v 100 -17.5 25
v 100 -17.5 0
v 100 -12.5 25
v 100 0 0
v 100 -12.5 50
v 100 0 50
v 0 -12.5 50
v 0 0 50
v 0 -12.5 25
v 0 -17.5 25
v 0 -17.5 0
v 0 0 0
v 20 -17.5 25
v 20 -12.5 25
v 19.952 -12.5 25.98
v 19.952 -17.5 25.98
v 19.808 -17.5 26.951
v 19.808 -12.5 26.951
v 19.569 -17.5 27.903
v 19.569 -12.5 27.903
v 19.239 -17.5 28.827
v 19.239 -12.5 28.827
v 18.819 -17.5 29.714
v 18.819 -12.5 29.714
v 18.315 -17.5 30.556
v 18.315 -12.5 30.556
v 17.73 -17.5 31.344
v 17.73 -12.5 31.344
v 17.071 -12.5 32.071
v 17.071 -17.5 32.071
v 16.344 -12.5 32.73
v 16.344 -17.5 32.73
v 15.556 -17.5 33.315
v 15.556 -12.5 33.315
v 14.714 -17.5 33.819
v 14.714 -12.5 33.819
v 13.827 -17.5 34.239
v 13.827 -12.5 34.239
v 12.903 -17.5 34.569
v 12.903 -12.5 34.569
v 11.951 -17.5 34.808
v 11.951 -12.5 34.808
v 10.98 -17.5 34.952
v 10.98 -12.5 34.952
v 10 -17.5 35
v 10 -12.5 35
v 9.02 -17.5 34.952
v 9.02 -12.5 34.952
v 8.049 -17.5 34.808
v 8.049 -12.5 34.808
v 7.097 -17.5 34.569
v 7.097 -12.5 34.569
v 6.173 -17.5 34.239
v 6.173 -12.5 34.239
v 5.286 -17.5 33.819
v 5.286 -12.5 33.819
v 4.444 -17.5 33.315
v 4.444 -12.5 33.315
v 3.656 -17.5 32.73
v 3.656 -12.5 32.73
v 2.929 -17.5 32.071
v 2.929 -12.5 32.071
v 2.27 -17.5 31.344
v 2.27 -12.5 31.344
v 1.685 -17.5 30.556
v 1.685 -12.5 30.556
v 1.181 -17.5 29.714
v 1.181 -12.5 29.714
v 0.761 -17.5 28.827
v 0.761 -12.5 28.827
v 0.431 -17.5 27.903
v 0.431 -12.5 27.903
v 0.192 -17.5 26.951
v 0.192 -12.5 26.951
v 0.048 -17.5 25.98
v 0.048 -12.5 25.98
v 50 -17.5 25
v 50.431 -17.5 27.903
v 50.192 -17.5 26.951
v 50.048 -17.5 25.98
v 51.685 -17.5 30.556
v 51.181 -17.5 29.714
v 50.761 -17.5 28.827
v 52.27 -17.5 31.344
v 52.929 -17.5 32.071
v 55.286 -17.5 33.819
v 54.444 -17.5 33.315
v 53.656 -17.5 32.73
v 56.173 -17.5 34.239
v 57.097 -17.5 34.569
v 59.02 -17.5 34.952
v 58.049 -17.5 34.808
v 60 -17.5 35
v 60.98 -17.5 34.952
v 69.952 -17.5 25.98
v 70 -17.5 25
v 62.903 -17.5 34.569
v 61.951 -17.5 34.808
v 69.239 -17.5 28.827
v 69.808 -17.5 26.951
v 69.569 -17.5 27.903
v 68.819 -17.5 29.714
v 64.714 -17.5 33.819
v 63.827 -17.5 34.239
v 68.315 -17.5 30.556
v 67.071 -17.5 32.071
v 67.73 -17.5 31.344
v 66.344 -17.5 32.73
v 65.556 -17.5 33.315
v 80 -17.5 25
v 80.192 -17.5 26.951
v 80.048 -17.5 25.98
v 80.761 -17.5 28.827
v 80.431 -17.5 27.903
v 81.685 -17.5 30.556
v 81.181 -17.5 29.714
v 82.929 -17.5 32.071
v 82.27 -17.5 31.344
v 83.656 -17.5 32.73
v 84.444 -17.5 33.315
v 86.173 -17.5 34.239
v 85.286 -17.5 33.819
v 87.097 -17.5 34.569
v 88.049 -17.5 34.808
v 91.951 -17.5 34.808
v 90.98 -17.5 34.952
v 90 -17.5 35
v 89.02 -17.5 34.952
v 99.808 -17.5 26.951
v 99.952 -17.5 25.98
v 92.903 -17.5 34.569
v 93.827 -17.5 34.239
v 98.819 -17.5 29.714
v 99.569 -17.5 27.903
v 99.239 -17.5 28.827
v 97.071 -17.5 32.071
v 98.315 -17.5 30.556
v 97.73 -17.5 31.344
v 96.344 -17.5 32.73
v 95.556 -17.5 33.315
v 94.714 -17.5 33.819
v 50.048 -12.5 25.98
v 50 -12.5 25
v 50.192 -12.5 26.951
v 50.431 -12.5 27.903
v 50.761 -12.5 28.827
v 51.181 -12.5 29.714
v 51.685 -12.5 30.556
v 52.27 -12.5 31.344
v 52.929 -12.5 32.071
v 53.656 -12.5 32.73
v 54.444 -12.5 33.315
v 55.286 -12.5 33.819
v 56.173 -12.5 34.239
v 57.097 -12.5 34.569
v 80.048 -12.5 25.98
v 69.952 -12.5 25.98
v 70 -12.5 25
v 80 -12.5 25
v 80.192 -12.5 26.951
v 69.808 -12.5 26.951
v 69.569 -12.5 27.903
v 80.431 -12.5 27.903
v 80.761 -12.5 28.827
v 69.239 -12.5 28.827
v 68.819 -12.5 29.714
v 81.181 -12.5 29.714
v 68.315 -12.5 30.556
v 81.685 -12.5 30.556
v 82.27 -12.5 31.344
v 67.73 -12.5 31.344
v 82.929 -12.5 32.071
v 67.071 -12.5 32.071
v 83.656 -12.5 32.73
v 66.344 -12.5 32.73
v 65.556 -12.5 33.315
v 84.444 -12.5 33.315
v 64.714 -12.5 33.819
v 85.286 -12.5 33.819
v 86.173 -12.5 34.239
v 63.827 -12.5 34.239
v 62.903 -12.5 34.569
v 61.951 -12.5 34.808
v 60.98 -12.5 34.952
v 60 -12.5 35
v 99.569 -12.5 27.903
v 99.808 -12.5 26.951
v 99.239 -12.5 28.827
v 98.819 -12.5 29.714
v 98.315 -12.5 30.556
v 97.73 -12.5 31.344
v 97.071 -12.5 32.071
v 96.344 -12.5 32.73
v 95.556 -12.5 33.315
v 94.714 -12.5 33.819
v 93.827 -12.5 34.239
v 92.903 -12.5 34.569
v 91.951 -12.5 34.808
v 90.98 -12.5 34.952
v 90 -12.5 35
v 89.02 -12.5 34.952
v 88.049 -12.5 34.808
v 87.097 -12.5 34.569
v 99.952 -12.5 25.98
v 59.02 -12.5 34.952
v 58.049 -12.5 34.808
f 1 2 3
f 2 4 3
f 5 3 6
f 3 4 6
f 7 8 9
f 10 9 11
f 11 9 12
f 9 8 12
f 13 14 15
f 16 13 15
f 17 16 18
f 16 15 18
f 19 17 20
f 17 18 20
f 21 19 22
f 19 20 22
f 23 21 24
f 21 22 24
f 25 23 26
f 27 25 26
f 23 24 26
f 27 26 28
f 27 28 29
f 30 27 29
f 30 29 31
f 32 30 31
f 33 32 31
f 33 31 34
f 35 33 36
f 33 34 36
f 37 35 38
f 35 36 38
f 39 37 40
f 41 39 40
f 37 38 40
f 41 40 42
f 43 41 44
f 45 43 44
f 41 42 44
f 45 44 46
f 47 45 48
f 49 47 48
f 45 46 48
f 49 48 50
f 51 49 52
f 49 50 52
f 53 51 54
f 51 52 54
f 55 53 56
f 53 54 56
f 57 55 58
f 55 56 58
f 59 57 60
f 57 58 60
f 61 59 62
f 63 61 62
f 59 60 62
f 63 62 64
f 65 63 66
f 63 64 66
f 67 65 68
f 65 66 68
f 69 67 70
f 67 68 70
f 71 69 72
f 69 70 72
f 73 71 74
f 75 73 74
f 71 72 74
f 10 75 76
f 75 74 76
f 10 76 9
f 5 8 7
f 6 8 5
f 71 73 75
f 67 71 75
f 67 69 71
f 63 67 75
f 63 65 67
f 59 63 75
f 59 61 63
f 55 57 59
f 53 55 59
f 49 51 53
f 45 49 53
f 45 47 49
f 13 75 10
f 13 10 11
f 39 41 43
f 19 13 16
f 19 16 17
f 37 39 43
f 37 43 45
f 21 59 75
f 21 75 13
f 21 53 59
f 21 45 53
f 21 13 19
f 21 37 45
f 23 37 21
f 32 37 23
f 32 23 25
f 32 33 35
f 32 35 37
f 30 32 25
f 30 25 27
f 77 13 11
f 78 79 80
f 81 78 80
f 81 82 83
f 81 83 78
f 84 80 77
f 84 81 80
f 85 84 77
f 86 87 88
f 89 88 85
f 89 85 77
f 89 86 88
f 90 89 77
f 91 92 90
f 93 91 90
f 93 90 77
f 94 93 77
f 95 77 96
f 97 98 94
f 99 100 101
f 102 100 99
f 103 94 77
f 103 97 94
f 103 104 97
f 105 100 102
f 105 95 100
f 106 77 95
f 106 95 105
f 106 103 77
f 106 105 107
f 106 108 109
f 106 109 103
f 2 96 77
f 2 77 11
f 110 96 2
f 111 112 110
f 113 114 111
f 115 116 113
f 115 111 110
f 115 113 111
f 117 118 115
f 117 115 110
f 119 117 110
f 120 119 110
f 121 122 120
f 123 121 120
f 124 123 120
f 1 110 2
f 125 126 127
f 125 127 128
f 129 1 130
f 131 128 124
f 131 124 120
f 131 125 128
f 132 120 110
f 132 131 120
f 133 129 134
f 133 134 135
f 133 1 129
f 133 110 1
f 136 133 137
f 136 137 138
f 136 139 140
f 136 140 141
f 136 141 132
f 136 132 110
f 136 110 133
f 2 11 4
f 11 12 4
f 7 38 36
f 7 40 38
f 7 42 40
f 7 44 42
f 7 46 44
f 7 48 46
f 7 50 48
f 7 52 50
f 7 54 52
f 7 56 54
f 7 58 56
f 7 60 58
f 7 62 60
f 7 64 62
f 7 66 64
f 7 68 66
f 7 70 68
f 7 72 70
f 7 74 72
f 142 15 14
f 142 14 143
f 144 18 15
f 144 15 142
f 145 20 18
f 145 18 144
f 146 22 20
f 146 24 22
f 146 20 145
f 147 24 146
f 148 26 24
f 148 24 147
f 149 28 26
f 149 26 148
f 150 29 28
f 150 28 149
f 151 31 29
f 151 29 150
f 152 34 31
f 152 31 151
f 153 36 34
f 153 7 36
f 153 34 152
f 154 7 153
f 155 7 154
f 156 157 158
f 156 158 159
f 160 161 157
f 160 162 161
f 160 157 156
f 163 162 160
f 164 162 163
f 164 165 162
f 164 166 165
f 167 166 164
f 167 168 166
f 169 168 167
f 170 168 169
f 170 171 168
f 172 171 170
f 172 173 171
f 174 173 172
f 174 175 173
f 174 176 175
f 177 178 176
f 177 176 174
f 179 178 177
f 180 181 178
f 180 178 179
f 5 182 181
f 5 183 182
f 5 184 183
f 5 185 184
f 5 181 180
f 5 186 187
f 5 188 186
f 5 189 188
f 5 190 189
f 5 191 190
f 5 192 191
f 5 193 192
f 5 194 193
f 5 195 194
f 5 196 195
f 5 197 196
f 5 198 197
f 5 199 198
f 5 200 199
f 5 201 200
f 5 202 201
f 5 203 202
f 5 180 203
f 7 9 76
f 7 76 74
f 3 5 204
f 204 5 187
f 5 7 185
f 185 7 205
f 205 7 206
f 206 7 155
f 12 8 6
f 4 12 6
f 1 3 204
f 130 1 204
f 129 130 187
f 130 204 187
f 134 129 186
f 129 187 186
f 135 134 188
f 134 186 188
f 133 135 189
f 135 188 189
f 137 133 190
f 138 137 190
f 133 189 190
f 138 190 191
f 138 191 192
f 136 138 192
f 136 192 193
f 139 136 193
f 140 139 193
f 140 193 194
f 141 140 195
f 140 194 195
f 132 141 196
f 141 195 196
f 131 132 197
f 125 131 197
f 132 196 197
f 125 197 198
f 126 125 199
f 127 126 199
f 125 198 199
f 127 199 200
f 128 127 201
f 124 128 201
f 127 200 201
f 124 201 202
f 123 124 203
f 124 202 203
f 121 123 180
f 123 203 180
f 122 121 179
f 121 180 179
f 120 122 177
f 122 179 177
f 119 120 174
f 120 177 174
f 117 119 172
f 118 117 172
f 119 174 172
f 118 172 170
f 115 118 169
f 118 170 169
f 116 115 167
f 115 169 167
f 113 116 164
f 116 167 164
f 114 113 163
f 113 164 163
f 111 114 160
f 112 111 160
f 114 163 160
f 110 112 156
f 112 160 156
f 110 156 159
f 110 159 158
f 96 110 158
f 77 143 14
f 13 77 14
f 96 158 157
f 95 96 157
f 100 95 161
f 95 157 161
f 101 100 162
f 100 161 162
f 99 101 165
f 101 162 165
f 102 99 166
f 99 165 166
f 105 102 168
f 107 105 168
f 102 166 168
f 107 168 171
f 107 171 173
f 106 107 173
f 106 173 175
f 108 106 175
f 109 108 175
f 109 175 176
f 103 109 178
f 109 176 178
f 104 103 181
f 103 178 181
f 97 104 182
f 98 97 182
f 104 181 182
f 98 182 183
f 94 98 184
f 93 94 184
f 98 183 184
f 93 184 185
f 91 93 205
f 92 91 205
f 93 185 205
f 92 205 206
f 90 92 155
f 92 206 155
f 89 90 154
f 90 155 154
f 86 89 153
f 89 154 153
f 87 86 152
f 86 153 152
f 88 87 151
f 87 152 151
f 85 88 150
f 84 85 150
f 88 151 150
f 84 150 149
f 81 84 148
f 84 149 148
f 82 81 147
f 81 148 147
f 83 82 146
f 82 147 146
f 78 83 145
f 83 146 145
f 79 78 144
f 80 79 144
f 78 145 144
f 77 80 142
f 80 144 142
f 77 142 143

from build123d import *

# Parameters (mm, degrees)
F0_W     = 100
F0_H     = 50
F1_DEPTH = 12.5
F3_DEPTH = 5


with BuildPart() as f1:
    # F0 (on Front) → F1 (new body)
    with BuildSketch(Plane.XZ):
        with Locations((50, 25)):
            Rectangle(F0_W, F0_H)
    extrude(amount=F1_DEPTH)

    # F2 (on face) → F3 (join)
    with BuildSketch(Plane.XZ.offset(12.5)):
        Polygon((20, 25), (0, 25), (0, 0), (100, 0), (100, 25), (80, 25), (70, 25), (50, 25), align=None)
        with BuildLine():
            ThreePointArc((20, 25), (10, 35), (0, 25))
            Line((0, 25), (20, 25))
        make_face()
        with BuildLine():
            ThreePointArc((70, 25), (60, 35), (50, 25))
            Line((50, 25), (70, 25))
        make_face()
        with BuildLine():
            Line((80, 25), (100, 25))
            ThreePointArc((100, 25), (90, 35), (80, 25))
        make_face()
    extrude(amount=F3_DEPTH)


solid = f1.part
